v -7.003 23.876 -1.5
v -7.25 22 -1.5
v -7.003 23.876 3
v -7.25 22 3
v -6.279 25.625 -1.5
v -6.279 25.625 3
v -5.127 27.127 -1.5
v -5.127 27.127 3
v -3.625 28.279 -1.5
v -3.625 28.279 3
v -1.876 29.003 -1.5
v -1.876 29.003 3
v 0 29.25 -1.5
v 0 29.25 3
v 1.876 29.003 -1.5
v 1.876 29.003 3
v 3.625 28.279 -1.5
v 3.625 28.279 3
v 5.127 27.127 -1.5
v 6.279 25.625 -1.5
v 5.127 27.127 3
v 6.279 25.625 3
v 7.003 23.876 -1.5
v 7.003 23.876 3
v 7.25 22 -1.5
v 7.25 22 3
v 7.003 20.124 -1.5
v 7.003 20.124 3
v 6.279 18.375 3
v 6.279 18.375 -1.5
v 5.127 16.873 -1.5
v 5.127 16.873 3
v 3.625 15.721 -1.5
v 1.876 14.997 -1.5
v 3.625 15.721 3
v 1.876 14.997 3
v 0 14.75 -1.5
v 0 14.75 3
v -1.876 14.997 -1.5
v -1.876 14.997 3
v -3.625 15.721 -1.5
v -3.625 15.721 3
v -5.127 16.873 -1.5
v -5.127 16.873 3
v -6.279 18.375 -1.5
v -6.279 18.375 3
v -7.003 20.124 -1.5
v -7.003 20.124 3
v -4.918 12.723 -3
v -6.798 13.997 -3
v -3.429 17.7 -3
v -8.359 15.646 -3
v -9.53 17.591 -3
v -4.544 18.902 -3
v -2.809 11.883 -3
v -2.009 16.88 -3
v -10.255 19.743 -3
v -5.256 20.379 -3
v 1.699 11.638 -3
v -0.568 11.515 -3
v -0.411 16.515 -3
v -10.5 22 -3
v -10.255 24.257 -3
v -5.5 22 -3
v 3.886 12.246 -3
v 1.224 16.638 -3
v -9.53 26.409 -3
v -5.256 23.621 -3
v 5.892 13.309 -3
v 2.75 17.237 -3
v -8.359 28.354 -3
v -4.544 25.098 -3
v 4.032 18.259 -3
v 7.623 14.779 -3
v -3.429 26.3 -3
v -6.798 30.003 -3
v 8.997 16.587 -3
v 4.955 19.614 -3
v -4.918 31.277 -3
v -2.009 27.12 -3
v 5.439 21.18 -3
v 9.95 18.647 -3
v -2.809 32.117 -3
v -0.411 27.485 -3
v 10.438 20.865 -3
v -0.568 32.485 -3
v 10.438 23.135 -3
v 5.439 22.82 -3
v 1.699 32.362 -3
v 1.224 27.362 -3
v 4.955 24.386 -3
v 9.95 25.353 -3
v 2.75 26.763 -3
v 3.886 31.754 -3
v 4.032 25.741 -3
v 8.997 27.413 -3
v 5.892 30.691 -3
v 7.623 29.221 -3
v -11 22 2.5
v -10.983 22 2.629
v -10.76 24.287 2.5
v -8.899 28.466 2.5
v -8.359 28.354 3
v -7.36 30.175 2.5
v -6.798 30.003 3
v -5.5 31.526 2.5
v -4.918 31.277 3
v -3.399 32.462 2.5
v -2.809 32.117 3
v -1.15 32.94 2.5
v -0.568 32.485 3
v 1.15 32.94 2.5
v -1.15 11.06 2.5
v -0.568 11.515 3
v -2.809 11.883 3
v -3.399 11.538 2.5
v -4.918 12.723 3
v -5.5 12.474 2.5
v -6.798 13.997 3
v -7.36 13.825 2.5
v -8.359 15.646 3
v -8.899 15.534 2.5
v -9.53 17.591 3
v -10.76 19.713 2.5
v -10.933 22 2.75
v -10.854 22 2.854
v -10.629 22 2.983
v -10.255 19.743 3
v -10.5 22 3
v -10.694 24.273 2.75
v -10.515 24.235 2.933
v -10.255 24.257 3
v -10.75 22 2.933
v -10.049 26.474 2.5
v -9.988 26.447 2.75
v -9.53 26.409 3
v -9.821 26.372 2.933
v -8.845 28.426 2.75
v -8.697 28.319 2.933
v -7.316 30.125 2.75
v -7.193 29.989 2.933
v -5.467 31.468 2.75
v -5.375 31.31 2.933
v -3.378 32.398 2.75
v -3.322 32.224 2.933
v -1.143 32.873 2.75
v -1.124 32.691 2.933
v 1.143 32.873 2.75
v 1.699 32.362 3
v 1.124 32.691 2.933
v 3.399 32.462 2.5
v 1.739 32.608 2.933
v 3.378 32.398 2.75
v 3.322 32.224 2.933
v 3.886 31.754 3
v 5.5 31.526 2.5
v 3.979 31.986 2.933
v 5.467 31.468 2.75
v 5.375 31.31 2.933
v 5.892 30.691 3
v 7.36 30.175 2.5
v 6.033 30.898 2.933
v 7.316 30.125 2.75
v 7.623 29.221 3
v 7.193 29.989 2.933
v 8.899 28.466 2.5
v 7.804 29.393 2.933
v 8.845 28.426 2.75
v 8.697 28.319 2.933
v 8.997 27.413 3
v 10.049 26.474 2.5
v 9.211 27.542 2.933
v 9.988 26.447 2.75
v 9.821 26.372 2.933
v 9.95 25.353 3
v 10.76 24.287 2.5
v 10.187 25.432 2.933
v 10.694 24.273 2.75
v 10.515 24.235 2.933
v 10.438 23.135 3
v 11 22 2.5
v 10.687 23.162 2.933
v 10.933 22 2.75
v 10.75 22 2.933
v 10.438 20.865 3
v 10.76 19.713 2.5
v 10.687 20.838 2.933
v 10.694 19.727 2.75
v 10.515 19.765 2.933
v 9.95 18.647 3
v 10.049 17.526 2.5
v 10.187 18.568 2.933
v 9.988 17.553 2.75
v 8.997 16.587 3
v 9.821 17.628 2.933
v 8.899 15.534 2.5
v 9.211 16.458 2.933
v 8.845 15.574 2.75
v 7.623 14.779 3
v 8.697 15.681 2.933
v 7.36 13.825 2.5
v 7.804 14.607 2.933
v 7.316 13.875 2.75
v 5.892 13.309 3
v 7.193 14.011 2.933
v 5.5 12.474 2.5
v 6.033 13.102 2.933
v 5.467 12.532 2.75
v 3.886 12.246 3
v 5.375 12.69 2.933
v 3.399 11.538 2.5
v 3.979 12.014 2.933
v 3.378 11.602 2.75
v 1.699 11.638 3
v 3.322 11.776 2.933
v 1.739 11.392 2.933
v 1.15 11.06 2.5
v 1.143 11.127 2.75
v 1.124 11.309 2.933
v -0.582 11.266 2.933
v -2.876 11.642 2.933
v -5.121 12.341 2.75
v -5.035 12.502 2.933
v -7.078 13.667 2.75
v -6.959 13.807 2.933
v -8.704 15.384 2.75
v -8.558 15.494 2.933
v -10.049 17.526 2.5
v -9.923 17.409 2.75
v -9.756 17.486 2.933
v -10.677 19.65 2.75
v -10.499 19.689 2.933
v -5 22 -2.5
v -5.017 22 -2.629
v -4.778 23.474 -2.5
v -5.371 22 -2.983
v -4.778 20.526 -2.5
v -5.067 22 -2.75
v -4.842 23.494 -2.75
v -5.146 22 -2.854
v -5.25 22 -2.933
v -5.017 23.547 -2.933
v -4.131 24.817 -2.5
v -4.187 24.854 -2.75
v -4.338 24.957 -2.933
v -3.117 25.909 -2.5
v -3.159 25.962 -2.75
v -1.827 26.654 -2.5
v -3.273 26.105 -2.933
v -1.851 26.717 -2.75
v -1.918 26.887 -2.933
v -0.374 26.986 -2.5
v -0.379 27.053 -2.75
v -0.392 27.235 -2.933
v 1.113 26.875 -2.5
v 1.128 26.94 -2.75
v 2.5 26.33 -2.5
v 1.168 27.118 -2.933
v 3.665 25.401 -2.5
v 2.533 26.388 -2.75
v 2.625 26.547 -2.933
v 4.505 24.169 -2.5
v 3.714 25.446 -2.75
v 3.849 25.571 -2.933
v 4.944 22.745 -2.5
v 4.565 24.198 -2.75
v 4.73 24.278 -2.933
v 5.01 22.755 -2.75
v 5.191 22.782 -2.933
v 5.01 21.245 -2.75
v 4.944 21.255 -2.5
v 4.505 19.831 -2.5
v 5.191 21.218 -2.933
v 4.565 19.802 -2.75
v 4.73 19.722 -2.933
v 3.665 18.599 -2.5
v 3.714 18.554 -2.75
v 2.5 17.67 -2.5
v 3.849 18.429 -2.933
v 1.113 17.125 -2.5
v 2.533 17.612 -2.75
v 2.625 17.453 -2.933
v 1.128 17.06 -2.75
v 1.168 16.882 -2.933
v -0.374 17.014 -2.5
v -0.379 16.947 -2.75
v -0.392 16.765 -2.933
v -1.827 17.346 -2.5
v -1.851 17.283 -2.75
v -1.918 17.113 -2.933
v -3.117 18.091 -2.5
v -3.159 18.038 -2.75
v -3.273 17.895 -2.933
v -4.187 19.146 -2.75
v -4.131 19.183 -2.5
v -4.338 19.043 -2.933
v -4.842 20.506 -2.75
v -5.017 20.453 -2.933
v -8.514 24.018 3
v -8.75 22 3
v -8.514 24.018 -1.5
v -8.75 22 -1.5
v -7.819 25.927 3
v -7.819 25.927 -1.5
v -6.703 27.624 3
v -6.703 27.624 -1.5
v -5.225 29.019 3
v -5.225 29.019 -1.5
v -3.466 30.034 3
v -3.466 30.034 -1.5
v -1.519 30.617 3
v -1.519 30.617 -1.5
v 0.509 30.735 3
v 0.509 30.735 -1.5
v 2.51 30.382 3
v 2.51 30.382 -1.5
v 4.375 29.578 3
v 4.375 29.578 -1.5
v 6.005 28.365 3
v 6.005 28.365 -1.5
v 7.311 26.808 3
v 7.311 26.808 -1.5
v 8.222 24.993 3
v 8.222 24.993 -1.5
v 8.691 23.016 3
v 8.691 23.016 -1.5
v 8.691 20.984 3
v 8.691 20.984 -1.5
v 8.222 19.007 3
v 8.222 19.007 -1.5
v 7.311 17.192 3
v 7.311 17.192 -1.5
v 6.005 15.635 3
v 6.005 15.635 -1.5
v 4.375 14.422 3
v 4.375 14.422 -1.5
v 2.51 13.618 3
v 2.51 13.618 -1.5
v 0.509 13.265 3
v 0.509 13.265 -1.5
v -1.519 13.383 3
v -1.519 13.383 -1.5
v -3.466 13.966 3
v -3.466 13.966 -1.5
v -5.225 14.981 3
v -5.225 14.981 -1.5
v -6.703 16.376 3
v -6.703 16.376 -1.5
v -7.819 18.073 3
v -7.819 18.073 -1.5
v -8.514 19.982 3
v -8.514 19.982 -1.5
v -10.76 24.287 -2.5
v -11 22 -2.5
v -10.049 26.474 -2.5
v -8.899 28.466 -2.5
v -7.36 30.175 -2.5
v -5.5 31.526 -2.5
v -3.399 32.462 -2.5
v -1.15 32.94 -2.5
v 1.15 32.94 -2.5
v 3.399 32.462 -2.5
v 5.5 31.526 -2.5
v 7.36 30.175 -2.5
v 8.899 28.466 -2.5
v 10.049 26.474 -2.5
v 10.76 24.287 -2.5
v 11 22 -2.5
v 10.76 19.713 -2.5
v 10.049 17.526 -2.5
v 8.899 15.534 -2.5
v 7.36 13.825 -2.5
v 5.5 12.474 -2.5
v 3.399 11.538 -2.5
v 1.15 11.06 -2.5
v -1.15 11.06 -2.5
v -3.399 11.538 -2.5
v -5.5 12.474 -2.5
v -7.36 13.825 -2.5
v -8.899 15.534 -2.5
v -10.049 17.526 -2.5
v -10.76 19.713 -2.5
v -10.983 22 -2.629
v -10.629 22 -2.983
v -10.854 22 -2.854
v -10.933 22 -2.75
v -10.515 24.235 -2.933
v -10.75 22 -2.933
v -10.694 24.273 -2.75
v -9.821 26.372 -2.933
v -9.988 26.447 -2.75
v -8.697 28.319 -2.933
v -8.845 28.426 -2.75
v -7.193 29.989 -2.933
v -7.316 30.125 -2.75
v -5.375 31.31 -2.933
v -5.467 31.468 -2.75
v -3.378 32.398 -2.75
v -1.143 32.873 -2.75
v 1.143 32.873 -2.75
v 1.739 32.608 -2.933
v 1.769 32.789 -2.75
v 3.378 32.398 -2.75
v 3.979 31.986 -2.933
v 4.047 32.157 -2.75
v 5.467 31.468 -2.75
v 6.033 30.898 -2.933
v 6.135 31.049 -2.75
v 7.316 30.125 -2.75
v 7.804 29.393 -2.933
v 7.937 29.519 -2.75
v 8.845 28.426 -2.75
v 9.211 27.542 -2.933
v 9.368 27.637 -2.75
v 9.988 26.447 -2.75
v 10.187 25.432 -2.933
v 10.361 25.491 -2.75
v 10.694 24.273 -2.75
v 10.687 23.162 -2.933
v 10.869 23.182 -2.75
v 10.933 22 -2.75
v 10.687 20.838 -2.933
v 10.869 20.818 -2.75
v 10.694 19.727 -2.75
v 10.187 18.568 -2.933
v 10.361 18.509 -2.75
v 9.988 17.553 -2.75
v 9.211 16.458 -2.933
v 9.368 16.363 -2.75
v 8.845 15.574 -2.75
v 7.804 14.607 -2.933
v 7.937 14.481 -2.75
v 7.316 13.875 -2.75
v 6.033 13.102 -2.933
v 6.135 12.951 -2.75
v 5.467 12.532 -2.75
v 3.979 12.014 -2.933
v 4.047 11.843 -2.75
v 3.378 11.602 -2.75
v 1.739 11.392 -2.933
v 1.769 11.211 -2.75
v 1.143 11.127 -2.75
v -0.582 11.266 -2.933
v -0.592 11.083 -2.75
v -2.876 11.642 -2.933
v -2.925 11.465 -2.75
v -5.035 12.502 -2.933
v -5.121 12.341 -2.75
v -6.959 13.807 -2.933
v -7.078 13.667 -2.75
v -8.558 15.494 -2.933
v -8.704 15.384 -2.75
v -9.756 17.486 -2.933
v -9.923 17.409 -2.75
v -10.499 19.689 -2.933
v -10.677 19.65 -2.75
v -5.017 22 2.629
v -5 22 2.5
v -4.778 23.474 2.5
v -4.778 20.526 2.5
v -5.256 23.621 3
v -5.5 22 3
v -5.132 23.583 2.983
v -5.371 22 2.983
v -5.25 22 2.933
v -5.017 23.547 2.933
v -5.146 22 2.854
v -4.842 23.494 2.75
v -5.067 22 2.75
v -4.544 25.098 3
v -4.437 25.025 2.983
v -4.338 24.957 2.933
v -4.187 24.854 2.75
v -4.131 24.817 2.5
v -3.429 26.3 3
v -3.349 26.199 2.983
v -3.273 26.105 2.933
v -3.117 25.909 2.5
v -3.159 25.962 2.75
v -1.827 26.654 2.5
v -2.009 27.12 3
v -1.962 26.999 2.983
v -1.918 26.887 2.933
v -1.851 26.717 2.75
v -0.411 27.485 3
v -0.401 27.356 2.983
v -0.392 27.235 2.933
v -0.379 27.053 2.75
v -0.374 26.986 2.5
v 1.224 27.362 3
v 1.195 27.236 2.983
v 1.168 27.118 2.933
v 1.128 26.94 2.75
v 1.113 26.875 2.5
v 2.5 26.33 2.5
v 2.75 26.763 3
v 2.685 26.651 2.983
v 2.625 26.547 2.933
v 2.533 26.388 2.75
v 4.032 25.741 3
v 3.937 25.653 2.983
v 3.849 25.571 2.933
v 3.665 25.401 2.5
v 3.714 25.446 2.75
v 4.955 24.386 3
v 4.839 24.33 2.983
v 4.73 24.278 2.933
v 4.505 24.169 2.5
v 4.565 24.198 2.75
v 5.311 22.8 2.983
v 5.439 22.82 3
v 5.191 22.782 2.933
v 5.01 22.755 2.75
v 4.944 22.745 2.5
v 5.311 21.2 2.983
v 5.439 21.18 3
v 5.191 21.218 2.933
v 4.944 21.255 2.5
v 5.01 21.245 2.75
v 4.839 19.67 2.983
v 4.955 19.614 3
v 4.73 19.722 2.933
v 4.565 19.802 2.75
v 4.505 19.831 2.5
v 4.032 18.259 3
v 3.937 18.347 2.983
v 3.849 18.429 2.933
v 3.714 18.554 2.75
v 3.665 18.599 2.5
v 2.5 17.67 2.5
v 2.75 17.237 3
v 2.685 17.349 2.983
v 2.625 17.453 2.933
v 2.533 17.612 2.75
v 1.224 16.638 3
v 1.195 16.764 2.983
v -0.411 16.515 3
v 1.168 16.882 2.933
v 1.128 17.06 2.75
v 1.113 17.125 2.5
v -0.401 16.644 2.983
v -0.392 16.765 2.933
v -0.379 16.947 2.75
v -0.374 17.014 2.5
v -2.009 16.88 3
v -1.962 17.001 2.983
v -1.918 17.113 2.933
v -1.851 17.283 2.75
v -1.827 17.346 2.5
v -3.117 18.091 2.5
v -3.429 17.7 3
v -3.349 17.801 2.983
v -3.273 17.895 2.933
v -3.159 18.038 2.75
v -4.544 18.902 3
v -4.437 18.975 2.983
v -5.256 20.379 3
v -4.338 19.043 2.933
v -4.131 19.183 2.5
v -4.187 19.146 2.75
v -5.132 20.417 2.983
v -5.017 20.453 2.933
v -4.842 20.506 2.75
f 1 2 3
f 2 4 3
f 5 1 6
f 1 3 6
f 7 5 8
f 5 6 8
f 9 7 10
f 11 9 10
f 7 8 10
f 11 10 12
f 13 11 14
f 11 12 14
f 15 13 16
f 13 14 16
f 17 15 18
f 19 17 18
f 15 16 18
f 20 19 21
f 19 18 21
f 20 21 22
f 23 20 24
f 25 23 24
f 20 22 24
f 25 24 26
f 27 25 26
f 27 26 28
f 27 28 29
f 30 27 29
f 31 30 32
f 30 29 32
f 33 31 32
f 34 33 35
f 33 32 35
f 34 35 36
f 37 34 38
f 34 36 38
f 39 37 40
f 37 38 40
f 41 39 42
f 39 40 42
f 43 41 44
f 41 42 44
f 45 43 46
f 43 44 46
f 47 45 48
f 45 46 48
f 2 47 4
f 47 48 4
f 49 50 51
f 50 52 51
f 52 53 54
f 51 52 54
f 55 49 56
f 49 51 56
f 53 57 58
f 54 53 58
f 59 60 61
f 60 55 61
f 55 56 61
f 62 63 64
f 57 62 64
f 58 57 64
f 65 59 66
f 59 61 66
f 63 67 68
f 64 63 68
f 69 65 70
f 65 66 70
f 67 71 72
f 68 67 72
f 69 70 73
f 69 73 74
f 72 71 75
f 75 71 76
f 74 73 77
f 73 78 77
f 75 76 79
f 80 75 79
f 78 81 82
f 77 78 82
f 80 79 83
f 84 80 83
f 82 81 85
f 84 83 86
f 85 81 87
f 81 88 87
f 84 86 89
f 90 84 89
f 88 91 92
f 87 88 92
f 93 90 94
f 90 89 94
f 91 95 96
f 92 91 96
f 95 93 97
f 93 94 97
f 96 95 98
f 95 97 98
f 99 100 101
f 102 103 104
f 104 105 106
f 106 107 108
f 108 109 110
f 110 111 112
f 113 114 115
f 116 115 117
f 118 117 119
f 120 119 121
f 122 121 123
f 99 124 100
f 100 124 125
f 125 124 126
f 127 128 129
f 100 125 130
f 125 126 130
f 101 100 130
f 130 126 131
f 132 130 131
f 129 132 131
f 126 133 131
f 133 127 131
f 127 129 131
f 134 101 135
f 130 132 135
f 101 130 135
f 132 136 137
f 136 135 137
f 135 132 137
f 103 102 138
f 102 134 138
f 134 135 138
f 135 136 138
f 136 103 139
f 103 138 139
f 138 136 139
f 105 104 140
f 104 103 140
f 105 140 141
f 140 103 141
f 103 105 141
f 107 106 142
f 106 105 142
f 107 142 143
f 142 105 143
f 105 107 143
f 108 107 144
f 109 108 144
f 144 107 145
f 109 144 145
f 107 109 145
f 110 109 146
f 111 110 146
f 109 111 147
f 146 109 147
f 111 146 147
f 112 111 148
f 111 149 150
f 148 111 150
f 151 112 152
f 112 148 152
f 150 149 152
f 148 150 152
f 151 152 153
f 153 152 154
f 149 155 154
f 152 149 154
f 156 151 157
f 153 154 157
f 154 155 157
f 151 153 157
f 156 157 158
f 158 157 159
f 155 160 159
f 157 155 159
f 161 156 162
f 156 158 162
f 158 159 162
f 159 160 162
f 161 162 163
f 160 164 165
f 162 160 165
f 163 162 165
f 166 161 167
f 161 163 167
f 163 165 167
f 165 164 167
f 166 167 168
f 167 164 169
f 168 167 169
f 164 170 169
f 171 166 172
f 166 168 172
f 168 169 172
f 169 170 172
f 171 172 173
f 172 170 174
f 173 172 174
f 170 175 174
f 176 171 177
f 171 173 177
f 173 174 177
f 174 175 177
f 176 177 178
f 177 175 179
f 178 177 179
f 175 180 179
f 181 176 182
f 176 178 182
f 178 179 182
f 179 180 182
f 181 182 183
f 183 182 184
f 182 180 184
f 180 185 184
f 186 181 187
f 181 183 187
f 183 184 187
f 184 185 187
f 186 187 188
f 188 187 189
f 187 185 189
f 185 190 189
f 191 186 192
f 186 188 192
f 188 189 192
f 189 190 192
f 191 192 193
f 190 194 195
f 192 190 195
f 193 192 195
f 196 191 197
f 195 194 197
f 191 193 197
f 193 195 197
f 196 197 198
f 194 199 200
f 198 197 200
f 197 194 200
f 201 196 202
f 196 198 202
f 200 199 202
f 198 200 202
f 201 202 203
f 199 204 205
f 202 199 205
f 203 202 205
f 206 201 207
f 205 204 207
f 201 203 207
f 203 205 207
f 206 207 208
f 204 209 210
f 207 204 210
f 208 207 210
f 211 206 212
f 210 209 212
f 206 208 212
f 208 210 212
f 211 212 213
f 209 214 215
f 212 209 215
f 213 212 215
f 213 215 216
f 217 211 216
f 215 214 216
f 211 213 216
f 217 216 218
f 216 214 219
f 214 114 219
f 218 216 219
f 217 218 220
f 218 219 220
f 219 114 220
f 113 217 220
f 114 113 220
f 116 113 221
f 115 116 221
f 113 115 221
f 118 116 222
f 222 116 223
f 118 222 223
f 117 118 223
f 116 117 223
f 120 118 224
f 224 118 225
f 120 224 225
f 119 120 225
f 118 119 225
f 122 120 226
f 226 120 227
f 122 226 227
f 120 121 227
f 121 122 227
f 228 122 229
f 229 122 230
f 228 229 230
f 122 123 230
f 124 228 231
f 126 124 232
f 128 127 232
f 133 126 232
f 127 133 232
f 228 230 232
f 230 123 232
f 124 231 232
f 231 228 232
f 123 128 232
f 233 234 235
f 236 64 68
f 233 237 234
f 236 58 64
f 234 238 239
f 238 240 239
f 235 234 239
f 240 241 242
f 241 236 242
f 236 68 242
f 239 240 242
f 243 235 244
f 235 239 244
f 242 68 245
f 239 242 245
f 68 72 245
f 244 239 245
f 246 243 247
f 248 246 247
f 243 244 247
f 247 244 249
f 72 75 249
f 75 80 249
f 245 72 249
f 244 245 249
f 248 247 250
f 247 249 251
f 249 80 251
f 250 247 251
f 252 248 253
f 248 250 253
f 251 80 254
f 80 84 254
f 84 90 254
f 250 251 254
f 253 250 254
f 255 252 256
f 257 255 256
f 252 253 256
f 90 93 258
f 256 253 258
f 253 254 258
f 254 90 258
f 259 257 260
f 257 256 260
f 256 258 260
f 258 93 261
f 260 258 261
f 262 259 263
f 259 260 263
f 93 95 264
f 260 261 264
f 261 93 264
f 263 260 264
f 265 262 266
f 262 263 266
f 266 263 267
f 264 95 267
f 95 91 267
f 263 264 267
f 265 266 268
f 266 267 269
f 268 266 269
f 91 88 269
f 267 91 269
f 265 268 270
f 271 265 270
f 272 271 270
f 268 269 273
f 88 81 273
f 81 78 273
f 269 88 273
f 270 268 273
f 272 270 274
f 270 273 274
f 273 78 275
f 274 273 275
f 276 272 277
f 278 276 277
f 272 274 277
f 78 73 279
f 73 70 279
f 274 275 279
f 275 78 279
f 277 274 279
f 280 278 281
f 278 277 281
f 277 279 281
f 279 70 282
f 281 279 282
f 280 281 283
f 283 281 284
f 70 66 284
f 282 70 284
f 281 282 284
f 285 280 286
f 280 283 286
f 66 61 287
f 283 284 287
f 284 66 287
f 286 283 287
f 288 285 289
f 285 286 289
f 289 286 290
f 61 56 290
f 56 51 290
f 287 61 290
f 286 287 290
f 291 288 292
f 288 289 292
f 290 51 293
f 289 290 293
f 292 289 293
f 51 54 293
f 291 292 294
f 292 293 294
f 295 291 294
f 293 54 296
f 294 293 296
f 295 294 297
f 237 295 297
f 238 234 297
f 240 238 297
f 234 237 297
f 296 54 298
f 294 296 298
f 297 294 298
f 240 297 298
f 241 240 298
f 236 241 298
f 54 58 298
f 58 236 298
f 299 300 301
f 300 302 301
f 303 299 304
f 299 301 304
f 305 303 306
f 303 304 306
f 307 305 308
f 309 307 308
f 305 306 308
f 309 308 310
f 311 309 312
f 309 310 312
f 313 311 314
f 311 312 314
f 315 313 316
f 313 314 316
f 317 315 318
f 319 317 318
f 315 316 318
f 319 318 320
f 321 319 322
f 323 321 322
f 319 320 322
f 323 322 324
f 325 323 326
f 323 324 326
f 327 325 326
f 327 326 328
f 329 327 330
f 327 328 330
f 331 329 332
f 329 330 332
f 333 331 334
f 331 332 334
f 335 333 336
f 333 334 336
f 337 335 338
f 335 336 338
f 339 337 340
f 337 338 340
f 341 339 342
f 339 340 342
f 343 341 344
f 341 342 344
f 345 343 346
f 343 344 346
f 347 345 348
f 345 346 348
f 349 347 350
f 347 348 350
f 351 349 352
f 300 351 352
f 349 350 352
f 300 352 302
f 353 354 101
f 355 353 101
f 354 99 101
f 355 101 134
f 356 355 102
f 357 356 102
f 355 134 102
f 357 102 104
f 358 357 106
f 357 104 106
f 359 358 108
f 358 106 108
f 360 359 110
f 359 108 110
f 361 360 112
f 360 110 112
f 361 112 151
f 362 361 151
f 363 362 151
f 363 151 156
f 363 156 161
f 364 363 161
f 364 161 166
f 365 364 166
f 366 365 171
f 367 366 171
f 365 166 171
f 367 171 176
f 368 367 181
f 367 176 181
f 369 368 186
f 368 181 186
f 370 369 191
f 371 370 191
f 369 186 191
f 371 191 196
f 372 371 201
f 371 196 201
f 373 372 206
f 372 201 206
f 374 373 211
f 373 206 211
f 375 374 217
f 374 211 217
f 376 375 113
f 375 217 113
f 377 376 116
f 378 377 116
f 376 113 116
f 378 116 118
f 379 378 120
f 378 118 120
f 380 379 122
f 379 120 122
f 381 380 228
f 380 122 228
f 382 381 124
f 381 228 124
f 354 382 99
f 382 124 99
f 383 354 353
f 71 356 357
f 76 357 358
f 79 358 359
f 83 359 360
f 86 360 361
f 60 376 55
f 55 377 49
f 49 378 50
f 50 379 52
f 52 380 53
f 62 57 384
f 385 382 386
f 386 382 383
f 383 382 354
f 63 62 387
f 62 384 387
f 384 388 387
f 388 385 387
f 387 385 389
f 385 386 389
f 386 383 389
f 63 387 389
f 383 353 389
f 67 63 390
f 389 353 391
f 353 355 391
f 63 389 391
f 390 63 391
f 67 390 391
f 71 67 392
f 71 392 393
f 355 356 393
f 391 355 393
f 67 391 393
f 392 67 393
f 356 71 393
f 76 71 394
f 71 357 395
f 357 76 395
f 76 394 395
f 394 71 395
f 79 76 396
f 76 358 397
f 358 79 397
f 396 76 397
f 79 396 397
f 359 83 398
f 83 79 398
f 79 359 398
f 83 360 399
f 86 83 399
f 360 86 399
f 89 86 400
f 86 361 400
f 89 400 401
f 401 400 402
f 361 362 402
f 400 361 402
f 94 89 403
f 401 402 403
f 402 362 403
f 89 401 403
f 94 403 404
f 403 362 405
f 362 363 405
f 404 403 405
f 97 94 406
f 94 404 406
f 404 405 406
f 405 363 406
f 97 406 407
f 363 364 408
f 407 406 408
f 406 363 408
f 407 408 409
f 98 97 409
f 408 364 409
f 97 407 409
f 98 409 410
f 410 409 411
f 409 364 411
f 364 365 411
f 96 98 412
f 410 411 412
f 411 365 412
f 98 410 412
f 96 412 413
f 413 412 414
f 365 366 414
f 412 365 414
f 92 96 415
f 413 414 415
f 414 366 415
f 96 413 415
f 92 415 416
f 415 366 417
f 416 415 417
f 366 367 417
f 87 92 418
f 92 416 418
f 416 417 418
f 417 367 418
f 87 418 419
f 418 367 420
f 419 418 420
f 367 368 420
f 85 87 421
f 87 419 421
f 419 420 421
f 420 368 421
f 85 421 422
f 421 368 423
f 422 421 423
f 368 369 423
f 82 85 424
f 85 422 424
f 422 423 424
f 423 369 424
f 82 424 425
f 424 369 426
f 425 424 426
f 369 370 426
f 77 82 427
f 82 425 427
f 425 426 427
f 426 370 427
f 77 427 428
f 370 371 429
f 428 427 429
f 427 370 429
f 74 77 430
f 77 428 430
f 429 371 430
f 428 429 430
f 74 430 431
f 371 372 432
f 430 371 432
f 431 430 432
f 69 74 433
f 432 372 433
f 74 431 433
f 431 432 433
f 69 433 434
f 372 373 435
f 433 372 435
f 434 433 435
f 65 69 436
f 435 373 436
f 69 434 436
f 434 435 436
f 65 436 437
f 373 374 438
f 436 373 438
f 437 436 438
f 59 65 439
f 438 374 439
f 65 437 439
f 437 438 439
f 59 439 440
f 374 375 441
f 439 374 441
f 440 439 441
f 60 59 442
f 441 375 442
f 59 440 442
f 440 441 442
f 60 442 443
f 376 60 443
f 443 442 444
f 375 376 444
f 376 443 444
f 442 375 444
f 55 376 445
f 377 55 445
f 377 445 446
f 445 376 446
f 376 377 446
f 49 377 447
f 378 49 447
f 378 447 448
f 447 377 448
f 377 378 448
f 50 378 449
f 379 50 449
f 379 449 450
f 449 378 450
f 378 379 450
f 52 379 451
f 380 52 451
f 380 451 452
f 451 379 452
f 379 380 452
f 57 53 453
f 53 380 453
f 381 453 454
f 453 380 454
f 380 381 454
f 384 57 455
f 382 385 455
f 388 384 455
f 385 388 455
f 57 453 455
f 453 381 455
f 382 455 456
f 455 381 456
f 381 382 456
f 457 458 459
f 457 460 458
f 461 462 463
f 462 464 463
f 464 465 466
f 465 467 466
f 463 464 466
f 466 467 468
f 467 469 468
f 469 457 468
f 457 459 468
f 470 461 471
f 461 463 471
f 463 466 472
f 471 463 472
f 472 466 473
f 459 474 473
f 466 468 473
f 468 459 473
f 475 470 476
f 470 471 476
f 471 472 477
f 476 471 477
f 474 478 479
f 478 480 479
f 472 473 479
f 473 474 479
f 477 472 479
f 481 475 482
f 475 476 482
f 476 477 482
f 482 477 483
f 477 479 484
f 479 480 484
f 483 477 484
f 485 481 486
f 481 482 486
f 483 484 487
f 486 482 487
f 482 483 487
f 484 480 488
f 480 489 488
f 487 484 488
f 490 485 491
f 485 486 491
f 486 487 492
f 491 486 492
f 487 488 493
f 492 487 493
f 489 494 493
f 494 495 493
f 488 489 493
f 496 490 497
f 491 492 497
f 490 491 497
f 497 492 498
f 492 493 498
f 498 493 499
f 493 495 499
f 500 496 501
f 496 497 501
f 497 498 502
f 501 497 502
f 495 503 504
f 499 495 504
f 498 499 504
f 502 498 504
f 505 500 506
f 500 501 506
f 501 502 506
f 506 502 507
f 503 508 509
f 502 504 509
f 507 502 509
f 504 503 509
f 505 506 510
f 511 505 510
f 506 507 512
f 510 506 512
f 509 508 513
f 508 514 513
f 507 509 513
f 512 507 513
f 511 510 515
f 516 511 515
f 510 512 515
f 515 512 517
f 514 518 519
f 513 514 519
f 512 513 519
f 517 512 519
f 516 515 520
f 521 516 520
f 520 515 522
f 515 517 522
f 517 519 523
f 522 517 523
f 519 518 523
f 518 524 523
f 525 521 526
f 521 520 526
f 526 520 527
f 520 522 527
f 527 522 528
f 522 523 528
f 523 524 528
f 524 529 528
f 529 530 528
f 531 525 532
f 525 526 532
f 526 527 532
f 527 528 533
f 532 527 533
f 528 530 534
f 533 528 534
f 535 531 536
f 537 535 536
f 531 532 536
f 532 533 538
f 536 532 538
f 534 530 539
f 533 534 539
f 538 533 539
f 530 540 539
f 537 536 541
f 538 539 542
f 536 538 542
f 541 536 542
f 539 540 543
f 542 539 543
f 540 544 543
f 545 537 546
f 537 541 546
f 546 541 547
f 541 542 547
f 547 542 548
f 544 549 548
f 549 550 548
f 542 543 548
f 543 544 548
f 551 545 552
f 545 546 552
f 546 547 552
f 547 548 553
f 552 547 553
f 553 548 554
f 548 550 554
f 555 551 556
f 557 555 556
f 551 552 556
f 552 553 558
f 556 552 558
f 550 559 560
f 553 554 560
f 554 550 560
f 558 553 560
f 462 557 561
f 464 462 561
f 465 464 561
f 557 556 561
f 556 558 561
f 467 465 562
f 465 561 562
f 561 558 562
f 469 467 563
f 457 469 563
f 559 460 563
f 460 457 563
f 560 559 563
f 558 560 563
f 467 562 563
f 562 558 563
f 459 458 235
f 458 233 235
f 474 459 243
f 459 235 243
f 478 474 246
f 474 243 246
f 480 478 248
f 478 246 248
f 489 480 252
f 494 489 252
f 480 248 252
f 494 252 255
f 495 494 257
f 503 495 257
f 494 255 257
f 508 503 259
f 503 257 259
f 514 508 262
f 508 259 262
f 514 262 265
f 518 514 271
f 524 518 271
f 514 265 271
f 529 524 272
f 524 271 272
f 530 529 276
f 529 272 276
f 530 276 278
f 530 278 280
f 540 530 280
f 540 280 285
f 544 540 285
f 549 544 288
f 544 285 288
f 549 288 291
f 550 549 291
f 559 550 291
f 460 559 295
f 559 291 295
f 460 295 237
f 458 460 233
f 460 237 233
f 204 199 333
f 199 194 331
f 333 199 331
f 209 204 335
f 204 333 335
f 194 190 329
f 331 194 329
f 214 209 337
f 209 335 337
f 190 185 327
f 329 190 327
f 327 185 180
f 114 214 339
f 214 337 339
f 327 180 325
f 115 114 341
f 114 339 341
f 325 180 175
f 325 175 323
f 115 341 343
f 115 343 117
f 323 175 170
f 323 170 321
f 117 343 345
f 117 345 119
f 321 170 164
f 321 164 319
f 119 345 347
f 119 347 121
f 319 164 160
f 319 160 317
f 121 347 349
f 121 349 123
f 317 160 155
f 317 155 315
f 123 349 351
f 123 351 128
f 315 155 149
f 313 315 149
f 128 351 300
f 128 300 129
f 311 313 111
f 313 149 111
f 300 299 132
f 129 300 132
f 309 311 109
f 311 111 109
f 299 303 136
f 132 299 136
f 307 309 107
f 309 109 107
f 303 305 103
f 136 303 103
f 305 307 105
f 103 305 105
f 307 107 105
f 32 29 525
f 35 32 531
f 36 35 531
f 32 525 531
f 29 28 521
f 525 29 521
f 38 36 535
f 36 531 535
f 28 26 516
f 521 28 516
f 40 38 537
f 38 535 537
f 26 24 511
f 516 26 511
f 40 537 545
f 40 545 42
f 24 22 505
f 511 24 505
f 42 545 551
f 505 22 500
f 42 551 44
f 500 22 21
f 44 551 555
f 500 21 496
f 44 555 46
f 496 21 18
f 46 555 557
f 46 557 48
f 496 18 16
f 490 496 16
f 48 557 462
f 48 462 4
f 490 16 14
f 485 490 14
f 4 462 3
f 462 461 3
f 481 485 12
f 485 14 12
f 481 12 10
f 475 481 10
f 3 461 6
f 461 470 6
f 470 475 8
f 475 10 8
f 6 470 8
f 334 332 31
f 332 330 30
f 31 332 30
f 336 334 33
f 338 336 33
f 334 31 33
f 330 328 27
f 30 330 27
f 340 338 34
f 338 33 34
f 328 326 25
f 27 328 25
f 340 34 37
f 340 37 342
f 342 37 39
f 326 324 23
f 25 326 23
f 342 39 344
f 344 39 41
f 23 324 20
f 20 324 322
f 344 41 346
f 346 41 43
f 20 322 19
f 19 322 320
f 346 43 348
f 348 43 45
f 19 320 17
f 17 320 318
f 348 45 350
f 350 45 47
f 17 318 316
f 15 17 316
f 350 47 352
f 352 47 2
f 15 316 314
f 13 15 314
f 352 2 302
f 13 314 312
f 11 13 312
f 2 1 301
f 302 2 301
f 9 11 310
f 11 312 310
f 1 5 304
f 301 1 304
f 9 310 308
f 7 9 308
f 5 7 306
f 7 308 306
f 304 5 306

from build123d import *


with BuildPart() as part:
    # Sketch1 → Revolve1 (revolve)
    with BuildSketch(Plane.XZ.offset(-22), mode=Mode.PRIVATE) as revolve1_sk:
        with BuildLine():
            Line((5, 2.5), (5, -2.5))
            ThreePointArc((5, -2.5), (5.146446609, -2.853553391), (5.5, -3))
            Line((5.5, -3), (10.5, -3))
            ThreePointArc((10.5, -3), (10.853553391, -2.853553391), (11, -2.5))
            Line((11, -2.5), (11, 2.5))
            ThreePointArc((11, 2.5), (10.853553391, 2.853553391), (10.5, 3))
            Line((10.5, 3), (8.75, 3))
            Line((8.75, 3), (8.75, -1.5))
            Line((8.75, -1.5), (7.25, -1.5))
            Line((7.25, -1.5), (7.25, 3))
            Line((7.25, 3), (5.5, 3))
            ThreePointArc((5.5, 3), (5.146446609, 2.853553391), (5, 2.5))
        make_face()
    revolve(revolve1_sk.sketch.rotate(Axis((0, 22, 3), (0, 0, -1)), 180), axis=Axis((0, 22, 3), (0, 0, -1)))


solid = part.part
